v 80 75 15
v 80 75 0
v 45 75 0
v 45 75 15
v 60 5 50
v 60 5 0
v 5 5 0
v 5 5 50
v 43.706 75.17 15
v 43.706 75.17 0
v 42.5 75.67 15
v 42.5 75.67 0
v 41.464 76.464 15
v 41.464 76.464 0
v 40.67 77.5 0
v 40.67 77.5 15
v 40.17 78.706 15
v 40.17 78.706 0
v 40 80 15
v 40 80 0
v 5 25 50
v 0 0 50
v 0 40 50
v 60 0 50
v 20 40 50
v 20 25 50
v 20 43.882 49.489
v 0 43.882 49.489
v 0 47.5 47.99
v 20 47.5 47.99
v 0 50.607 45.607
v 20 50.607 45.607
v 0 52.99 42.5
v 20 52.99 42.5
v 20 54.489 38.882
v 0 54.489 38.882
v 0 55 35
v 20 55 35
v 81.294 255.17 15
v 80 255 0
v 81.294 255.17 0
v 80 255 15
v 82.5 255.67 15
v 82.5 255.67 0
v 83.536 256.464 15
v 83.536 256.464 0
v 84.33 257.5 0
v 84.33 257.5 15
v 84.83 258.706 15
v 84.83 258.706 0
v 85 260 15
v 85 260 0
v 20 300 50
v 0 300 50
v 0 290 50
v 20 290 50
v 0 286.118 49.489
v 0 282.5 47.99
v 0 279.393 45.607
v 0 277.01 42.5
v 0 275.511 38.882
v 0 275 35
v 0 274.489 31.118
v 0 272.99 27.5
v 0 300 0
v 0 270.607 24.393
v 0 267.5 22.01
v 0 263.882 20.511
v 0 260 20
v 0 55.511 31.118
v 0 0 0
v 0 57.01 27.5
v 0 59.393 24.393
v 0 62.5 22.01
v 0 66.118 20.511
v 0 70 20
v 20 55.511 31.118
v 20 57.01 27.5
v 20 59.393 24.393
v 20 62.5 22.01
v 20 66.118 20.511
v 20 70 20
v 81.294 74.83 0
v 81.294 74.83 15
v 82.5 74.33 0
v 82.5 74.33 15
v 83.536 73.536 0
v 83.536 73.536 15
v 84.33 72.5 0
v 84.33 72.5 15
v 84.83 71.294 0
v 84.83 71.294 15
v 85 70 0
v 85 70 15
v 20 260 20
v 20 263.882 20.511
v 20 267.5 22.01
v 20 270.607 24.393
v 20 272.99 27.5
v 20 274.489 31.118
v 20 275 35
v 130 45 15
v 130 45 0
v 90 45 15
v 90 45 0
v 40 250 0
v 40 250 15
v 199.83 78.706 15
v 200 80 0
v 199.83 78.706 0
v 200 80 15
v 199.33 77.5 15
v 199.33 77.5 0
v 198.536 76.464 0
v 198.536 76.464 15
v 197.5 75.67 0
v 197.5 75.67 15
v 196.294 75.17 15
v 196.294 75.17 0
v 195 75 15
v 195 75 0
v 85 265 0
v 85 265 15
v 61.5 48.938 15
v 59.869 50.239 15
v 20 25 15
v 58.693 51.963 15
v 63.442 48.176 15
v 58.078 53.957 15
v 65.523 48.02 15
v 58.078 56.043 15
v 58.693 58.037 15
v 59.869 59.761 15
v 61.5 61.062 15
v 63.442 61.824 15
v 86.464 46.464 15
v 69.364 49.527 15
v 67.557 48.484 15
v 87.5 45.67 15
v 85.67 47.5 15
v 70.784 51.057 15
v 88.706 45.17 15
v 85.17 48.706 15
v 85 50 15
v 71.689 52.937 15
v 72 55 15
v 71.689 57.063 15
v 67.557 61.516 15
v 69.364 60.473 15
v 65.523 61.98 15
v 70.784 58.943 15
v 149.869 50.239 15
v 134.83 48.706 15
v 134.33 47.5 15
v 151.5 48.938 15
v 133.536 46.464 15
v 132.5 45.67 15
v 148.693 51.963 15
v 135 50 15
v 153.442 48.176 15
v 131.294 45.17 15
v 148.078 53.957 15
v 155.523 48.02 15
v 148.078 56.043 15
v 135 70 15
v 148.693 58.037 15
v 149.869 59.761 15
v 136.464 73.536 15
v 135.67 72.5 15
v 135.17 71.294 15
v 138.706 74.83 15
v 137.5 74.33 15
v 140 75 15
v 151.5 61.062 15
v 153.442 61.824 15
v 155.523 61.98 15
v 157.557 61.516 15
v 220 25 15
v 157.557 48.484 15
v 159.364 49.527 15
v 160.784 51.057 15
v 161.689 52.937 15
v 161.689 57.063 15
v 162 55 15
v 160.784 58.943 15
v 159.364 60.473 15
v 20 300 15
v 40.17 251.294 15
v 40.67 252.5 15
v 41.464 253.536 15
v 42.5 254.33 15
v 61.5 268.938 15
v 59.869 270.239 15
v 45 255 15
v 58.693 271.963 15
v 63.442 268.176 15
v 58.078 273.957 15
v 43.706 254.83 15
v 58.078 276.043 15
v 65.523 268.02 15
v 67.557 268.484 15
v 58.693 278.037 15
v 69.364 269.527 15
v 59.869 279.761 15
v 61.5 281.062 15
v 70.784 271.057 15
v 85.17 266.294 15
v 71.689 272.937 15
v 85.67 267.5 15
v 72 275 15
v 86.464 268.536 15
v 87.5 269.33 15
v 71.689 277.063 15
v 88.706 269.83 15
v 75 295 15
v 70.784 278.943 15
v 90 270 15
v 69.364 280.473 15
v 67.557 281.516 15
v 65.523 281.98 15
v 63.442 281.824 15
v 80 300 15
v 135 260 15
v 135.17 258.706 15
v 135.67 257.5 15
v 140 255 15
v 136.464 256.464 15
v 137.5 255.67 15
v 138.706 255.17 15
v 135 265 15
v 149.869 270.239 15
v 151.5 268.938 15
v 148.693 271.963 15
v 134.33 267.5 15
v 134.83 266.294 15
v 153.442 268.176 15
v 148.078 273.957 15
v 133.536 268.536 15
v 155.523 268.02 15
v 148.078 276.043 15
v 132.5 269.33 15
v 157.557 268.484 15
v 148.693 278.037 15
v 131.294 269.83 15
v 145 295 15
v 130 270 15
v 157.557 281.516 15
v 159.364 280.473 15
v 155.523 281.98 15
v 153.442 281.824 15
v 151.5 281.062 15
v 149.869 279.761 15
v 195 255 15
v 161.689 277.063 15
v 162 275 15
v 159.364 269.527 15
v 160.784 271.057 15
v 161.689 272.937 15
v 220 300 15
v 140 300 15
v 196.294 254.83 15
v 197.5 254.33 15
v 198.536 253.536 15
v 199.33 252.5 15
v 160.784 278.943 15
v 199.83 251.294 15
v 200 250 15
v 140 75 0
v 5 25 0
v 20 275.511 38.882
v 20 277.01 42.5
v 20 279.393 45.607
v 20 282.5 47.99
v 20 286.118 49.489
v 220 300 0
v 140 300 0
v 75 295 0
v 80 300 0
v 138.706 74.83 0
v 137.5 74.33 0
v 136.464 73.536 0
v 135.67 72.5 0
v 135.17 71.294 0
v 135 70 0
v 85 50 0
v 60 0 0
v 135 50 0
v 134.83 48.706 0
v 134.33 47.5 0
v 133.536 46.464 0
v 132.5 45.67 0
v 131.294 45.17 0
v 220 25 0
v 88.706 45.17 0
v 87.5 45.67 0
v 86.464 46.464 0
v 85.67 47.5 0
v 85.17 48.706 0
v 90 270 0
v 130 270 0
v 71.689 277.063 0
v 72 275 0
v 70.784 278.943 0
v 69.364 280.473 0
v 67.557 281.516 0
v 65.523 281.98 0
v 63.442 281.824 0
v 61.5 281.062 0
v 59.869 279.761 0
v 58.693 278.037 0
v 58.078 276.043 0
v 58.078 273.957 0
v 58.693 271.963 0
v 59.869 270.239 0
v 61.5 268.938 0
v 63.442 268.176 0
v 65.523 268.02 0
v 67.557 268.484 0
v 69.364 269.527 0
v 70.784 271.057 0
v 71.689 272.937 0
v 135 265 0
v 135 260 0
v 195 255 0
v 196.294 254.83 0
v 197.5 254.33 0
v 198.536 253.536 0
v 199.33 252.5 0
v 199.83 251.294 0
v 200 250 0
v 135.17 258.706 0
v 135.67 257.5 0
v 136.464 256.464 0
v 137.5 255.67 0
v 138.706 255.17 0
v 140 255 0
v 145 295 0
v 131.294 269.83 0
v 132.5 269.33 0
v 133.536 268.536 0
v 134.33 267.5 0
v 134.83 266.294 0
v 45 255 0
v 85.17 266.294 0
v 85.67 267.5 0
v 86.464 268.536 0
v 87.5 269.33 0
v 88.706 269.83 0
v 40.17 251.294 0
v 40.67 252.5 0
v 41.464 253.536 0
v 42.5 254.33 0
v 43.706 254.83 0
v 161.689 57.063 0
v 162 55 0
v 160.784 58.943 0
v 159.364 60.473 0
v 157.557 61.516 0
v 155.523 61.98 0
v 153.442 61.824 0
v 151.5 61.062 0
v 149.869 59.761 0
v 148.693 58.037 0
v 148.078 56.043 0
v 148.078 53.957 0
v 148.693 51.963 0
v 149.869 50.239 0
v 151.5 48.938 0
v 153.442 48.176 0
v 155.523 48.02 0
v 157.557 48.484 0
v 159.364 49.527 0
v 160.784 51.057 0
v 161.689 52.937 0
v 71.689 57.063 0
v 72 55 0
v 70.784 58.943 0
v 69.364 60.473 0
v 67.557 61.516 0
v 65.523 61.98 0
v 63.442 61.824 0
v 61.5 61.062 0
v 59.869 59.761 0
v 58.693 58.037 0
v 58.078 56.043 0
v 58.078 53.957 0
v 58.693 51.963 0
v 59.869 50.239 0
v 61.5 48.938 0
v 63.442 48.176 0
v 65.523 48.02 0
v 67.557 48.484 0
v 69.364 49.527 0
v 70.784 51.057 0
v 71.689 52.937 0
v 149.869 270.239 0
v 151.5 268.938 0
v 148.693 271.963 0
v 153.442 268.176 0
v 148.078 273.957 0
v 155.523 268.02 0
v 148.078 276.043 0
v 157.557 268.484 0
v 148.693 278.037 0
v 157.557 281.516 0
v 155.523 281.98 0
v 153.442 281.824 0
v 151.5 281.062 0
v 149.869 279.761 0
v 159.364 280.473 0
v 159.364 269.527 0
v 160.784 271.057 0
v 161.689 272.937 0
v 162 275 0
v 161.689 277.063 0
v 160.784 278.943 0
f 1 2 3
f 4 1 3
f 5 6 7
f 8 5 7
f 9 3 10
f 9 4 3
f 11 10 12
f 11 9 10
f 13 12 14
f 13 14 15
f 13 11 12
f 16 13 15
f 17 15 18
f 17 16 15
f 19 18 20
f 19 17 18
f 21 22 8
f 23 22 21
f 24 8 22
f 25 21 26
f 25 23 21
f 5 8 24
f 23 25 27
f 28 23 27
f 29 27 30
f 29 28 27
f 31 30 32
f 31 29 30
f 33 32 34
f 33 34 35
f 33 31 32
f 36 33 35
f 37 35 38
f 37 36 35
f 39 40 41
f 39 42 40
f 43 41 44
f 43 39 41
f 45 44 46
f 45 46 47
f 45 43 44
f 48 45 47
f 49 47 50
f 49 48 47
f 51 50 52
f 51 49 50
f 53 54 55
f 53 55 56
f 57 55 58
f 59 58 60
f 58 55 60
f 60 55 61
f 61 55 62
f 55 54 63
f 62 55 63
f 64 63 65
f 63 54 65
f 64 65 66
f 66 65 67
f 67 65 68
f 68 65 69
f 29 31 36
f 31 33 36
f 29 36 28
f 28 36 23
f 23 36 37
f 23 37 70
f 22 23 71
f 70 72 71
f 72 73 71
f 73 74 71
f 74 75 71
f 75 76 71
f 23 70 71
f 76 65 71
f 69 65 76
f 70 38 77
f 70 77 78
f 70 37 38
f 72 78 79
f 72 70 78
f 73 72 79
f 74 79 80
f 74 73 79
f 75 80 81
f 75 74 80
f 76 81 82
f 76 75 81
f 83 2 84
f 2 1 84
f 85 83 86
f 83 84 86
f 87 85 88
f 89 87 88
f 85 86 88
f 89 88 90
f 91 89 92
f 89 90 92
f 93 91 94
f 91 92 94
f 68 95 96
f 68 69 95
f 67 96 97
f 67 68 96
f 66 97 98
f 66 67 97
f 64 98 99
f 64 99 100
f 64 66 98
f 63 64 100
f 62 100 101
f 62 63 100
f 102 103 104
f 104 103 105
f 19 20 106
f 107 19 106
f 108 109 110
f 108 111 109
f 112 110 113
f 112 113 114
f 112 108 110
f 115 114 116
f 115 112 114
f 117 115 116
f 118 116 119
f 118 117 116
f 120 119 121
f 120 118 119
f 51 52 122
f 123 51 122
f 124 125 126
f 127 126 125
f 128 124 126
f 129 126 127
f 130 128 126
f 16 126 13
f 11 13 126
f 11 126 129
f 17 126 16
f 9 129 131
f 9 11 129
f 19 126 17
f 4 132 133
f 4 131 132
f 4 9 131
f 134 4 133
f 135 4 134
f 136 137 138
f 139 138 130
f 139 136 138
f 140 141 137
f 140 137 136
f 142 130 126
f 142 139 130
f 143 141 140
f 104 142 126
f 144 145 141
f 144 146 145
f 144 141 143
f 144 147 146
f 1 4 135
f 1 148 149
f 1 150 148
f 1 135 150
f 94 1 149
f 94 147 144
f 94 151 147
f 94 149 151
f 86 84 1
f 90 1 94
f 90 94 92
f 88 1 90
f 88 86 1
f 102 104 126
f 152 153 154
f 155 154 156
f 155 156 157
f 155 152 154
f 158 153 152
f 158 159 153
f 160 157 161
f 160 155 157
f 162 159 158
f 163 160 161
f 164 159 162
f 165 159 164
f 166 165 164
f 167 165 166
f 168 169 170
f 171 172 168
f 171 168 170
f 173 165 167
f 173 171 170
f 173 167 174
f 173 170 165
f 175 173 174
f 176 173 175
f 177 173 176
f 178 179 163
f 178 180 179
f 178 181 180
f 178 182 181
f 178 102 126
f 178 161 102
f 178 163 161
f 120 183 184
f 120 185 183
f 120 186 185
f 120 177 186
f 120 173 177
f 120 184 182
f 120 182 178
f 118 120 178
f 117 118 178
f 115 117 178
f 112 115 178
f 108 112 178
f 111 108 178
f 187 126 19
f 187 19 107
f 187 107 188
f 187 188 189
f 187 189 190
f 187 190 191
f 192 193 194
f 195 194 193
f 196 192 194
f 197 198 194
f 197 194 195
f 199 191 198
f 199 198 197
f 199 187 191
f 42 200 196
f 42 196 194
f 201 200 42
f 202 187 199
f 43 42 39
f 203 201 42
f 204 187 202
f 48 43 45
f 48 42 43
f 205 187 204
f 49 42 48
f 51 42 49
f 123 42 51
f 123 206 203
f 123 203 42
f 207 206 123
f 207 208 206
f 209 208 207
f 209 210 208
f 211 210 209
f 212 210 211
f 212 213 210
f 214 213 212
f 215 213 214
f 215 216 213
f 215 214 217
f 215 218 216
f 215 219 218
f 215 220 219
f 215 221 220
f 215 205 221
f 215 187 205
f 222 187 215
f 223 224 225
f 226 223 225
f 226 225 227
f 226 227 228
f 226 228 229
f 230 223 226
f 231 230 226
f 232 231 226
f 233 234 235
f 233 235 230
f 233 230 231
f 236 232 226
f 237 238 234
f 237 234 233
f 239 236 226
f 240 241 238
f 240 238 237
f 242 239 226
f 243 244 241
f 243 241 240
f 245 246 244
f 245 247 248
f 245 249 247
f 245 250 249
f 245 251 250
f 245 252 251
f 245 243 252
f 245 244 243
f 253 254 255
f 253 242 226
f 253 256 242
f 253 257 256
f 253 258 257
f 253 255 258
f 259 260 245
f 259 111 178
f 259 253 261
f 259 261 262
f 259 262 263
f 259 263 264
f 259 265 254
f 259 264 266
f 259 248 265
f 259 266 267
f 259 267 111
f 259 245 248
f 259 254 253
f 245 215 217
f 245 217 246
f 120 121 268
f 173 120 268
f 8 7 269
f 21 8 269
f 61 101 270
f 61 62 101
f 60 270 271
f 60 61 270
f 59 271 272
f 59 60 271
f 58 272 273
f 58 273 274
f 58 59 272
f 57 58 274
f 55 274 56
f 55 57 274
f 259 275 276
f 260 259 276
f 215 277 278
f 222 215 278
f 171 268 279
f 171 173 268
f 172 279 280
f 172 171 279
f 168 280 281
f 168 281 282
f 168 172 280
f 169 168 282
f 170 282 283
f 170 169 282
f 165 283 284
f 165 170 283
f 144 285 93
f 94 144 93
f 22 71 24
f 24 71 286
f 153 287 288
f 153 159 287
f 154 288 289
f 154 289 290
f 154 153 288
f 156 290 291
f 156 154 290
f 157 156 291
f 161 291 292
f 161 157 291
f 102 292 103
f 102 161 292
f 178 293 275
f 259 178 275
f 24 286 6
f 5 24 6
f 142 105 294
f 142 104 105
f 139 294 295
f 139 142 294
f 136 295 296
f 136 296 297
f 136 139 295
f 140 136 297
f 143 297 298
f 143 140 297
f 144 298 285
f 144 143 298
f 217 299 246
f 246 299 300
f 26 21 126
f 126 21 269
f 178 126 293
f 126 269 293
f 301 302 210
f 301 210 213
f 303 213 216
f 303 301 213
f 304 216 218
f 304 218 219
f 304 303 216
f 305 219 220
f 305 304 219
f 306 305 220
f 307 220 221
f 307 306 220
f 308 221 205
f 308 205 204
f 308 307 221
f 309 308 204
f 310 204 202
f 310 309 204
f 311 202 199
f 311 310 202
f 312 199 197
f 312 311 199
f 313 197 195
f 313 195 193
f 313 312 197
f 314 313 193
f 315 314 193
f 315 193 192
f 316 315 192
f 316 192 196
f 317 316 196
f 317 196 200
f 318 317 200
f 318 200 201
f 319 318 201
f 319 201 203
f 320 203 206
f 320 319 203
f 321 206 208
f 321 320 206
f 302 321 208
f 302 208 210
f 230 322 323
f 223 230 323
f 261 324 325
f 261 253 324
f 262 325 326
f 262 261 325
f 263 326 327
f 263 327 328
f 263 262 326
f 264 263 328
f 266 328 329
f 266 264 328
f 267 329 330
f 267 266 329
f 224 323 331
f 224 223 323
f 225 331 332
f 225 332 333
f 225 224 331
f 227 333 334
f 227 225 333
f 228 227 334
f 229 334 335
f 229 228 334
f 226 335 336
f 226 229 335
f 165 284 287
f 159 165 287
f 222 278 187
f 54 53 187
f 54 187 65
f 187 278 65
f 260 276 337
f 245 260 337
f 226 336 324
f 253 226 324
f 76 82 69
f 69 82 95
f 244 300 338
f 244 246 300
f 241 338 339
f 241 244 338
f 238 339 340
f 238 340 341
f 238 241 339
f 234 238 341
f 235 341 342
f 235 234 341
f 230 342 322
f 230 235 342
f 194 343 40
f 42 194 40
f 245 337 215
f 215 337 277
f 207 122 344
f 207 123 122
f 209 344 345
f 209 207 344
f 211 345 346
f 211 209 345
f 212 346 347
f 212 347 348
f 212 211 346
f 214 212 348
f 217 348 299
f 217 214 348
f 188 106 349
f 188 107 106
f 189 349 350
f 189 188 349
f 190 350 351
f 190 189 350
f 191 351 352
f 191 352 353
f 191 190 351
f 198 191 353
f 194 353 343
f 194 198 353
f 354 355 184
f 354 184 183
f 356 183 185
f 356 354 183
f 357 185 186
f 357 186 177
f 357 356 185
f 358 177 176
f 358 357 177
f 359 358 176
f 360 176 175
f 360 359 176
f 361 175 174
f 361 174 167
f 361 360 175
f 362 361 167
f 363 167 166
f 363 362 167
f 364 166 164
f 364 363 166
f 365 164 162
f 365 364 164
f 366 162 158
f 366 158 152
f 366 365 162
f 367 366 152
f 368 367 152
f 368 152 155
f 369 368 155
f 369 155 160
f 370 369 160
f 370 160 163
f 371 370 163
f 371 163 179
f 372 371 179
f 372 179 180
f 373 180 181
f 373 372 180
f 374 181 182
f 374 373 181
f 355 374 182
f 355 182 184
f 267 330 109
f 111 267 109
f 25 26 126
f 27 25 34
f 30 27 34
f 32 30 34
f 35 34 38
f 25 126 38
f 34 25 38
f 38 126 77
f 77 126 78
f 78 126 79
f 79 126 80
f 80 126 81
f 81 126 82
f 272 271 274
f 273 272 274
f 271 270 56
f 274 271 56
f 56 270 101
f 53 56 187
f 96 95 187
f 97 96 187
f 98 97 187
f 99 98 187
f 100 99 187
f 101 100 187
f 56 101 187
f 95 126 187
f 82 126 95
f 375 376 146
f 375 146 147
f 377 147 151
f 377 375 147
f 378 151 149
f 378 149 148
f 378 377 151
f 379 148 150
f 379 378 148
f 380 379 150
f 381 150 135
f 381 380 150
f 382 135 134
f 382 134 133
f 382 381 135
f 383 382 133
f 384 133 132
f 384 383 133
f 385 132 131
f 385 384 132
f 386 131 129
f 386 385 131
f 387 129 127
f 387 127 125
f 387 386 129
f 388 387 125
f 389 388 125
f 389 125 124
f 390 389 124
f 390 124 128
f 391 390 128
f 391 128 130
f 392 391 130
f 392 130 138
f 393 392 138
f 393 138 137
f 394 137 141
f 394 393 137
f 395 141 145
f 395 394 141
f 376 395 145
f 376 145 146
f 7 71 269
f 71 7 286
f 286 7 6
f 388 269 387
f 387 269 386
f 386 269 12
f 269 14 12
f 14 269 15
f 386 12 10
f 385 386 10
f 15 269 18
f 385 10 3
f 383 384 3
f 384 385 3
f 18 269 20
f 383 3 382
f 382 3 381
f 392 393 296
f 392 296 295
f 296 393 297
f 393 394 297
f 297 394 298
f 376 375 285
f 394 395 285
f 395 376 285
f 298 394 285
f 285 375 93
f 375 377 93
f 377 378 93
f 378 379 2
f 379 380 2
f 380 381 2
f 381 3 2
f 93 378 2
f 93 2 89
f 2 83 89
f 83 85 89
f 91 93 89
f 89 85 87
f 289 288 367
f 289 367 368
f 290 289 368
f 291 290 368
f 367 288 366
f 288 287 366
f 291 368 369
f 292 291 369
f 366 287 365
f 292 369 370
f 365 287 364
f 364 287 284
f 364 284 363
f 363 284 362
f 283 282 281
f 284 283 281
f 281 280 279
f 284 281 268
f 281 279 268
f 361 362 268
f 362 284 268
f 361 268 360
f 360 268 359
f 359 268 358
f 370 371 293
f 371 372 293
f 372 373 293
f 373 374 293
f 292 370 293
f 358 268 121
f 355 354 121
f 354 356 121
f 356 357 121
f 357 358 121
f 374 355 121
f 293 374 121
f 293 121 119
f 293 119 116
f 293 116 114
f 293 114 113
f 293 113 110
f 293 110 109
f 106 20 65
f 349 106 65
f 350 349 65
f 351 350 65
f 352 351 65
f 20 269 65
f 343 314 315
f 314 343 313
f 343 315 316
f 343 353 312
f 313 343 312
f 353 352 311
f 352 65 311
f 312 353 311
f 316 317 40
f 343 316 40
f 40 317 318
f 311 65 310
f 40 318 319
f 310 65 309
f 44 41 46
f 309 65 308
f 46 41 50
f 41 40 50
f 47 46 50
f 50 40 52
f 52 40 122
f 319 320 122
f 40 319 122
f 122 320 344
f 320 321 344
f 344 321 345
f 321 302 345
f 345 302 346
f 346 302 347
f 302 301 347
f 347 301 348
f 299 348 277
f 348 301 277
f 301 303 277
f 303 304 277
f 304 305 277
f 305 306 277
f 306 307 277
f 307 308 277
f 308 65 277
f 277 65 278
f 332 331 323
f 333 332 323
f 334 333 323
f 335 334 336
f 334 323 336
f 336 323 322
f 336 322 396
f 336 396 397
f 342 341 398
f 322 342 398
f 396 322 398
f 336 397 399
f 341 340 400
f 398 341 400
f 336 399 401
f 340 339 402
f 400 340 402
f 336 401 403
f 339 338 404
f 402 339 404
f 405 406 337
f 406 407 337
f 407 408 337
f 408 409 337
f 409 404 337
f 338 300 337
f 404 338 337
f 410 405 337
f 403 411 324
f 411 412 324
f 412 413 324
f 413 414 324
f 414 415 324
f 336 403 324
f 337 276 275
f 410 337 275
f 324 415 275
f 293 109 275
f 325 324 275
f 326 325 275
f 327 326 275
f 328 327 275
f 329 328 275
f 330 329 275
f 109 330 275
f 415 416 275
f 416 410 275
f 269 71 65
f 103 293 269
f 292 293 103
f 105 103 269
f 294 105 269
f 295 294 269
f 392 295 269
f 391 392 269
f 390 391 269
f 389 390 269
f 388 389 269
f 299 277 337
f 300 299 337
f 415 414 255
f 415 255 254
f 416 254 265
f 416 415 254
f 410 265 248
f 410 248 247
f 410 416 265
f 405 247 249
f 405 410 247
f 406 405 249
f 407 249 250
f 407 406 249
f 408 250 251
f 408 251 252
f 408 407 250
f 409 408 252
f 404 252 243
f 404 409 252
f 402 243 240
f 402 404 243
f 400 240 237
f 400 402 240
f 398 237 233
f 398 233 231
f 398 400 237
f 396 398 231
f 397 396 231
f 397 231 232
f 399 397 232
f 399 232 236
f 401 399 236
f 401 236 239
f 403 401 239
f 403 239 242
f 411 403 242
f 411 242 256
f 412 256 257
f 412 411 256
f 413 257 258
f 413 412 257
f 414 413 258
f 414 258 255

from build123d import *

# Parameters (mm, degrees)
F0_R     = 7
F1_DEPTH = 15
F2_DEPTH = 50
F3_W     = 220
F3_H     = 30
F4_DEPTH = 25
F5_R     = 14.99999
F6_R     = 5


# Not quite as in the source:
# - a fillet or chamfer is up to 0.001 mm smaller than in the source, because OpenCascade refuses the exact size


with BuildPart() as f1:
    # F0 (on Top) → F1 (new body)
    with BuildSketch(Plane.XY):
        Polygon((0, 300), (0, 0), (60, 0), (60, 5), (5, 5), (5, 25), (20, 25), (20, 300), align=None)
        Polygon((80, 300), (20, 300), (20, 25), (220, 25), (220, 300), (140, 300), (145, 295), (75, 295), align=None)
        with Locations((65, 55)):
            Circle(F0_R, mode=Mode.SUBTRACT)
        with Locations((155, 55)):
            Circle(F0_R, mode=Mode.SUBTRACT)
        Polygon((40, 75), (40, 255), (85, 255), (85, 270), (135, 270), (135, 255), (200, 255), (200, 75), (135, 75), (135, 45), (85, 45), (85, 75), align=None, mode=Mode.SUBTRACT)
        with Locations((65, 275)):
            Circle(F0_R, mode=Mode.SUBTRACT)
        with Locations((155, 275)):
            Circle(F0_R, mode=Mode.SUBTRACT)
    extrude(amount=F1_DEPTH)

    # F0 (on Top) → F2 (join)
    with BuildSketch(Plane.XY):
        Polygon((0, 300), (0, 0), (60, 0), (60, 5), (5, 5), (5, 25), (20, 25), (20, 300), align=None)
    extrude(amount=F2_DEPTH)

    # F3 (on face) → F4 (cut)
    with BuildSketch(Plane.YZ.offset(20)):
        with Locations((165, 35)):
            Rectangle(F3_W, F3_H)
    extrude(amount=-F4_DEPTH, mode=Mode.SUBTRACT)

    # F5 (radius 15 in the source; OpenCascade refuses exactly that, so slightly less here)
    f5_edges = [f1.edges().sort_by_distance(p)[0] for p in [
        (10, 275, 20),
        (10, 55, 20),
        (10, 275, 50),
        (10, 55, 50),
    ]]
    fillet(f5_edges, radius=F5_R)

    # F6
    f6_edges = [f1.edges().sort_by_distance(p)[0] for p in [
        (85, 75, 7.5),
        (135, 75, 7.5),
        (85, 45, 7.5),
        (135, 45, 7.5),
        (85, 255, 7.5),
        (85, 270, 7.5),
        (135, 255, 7.5),
        (135, 270, 7.5),
        (40, 75, 7.5),
        (40, 255, 7.5),
        (200, 255, 7.5),
        (200, 75, 7.5),
    ]]
    fillet(f6_edges, radius=F6_R)


solid = f1.part
